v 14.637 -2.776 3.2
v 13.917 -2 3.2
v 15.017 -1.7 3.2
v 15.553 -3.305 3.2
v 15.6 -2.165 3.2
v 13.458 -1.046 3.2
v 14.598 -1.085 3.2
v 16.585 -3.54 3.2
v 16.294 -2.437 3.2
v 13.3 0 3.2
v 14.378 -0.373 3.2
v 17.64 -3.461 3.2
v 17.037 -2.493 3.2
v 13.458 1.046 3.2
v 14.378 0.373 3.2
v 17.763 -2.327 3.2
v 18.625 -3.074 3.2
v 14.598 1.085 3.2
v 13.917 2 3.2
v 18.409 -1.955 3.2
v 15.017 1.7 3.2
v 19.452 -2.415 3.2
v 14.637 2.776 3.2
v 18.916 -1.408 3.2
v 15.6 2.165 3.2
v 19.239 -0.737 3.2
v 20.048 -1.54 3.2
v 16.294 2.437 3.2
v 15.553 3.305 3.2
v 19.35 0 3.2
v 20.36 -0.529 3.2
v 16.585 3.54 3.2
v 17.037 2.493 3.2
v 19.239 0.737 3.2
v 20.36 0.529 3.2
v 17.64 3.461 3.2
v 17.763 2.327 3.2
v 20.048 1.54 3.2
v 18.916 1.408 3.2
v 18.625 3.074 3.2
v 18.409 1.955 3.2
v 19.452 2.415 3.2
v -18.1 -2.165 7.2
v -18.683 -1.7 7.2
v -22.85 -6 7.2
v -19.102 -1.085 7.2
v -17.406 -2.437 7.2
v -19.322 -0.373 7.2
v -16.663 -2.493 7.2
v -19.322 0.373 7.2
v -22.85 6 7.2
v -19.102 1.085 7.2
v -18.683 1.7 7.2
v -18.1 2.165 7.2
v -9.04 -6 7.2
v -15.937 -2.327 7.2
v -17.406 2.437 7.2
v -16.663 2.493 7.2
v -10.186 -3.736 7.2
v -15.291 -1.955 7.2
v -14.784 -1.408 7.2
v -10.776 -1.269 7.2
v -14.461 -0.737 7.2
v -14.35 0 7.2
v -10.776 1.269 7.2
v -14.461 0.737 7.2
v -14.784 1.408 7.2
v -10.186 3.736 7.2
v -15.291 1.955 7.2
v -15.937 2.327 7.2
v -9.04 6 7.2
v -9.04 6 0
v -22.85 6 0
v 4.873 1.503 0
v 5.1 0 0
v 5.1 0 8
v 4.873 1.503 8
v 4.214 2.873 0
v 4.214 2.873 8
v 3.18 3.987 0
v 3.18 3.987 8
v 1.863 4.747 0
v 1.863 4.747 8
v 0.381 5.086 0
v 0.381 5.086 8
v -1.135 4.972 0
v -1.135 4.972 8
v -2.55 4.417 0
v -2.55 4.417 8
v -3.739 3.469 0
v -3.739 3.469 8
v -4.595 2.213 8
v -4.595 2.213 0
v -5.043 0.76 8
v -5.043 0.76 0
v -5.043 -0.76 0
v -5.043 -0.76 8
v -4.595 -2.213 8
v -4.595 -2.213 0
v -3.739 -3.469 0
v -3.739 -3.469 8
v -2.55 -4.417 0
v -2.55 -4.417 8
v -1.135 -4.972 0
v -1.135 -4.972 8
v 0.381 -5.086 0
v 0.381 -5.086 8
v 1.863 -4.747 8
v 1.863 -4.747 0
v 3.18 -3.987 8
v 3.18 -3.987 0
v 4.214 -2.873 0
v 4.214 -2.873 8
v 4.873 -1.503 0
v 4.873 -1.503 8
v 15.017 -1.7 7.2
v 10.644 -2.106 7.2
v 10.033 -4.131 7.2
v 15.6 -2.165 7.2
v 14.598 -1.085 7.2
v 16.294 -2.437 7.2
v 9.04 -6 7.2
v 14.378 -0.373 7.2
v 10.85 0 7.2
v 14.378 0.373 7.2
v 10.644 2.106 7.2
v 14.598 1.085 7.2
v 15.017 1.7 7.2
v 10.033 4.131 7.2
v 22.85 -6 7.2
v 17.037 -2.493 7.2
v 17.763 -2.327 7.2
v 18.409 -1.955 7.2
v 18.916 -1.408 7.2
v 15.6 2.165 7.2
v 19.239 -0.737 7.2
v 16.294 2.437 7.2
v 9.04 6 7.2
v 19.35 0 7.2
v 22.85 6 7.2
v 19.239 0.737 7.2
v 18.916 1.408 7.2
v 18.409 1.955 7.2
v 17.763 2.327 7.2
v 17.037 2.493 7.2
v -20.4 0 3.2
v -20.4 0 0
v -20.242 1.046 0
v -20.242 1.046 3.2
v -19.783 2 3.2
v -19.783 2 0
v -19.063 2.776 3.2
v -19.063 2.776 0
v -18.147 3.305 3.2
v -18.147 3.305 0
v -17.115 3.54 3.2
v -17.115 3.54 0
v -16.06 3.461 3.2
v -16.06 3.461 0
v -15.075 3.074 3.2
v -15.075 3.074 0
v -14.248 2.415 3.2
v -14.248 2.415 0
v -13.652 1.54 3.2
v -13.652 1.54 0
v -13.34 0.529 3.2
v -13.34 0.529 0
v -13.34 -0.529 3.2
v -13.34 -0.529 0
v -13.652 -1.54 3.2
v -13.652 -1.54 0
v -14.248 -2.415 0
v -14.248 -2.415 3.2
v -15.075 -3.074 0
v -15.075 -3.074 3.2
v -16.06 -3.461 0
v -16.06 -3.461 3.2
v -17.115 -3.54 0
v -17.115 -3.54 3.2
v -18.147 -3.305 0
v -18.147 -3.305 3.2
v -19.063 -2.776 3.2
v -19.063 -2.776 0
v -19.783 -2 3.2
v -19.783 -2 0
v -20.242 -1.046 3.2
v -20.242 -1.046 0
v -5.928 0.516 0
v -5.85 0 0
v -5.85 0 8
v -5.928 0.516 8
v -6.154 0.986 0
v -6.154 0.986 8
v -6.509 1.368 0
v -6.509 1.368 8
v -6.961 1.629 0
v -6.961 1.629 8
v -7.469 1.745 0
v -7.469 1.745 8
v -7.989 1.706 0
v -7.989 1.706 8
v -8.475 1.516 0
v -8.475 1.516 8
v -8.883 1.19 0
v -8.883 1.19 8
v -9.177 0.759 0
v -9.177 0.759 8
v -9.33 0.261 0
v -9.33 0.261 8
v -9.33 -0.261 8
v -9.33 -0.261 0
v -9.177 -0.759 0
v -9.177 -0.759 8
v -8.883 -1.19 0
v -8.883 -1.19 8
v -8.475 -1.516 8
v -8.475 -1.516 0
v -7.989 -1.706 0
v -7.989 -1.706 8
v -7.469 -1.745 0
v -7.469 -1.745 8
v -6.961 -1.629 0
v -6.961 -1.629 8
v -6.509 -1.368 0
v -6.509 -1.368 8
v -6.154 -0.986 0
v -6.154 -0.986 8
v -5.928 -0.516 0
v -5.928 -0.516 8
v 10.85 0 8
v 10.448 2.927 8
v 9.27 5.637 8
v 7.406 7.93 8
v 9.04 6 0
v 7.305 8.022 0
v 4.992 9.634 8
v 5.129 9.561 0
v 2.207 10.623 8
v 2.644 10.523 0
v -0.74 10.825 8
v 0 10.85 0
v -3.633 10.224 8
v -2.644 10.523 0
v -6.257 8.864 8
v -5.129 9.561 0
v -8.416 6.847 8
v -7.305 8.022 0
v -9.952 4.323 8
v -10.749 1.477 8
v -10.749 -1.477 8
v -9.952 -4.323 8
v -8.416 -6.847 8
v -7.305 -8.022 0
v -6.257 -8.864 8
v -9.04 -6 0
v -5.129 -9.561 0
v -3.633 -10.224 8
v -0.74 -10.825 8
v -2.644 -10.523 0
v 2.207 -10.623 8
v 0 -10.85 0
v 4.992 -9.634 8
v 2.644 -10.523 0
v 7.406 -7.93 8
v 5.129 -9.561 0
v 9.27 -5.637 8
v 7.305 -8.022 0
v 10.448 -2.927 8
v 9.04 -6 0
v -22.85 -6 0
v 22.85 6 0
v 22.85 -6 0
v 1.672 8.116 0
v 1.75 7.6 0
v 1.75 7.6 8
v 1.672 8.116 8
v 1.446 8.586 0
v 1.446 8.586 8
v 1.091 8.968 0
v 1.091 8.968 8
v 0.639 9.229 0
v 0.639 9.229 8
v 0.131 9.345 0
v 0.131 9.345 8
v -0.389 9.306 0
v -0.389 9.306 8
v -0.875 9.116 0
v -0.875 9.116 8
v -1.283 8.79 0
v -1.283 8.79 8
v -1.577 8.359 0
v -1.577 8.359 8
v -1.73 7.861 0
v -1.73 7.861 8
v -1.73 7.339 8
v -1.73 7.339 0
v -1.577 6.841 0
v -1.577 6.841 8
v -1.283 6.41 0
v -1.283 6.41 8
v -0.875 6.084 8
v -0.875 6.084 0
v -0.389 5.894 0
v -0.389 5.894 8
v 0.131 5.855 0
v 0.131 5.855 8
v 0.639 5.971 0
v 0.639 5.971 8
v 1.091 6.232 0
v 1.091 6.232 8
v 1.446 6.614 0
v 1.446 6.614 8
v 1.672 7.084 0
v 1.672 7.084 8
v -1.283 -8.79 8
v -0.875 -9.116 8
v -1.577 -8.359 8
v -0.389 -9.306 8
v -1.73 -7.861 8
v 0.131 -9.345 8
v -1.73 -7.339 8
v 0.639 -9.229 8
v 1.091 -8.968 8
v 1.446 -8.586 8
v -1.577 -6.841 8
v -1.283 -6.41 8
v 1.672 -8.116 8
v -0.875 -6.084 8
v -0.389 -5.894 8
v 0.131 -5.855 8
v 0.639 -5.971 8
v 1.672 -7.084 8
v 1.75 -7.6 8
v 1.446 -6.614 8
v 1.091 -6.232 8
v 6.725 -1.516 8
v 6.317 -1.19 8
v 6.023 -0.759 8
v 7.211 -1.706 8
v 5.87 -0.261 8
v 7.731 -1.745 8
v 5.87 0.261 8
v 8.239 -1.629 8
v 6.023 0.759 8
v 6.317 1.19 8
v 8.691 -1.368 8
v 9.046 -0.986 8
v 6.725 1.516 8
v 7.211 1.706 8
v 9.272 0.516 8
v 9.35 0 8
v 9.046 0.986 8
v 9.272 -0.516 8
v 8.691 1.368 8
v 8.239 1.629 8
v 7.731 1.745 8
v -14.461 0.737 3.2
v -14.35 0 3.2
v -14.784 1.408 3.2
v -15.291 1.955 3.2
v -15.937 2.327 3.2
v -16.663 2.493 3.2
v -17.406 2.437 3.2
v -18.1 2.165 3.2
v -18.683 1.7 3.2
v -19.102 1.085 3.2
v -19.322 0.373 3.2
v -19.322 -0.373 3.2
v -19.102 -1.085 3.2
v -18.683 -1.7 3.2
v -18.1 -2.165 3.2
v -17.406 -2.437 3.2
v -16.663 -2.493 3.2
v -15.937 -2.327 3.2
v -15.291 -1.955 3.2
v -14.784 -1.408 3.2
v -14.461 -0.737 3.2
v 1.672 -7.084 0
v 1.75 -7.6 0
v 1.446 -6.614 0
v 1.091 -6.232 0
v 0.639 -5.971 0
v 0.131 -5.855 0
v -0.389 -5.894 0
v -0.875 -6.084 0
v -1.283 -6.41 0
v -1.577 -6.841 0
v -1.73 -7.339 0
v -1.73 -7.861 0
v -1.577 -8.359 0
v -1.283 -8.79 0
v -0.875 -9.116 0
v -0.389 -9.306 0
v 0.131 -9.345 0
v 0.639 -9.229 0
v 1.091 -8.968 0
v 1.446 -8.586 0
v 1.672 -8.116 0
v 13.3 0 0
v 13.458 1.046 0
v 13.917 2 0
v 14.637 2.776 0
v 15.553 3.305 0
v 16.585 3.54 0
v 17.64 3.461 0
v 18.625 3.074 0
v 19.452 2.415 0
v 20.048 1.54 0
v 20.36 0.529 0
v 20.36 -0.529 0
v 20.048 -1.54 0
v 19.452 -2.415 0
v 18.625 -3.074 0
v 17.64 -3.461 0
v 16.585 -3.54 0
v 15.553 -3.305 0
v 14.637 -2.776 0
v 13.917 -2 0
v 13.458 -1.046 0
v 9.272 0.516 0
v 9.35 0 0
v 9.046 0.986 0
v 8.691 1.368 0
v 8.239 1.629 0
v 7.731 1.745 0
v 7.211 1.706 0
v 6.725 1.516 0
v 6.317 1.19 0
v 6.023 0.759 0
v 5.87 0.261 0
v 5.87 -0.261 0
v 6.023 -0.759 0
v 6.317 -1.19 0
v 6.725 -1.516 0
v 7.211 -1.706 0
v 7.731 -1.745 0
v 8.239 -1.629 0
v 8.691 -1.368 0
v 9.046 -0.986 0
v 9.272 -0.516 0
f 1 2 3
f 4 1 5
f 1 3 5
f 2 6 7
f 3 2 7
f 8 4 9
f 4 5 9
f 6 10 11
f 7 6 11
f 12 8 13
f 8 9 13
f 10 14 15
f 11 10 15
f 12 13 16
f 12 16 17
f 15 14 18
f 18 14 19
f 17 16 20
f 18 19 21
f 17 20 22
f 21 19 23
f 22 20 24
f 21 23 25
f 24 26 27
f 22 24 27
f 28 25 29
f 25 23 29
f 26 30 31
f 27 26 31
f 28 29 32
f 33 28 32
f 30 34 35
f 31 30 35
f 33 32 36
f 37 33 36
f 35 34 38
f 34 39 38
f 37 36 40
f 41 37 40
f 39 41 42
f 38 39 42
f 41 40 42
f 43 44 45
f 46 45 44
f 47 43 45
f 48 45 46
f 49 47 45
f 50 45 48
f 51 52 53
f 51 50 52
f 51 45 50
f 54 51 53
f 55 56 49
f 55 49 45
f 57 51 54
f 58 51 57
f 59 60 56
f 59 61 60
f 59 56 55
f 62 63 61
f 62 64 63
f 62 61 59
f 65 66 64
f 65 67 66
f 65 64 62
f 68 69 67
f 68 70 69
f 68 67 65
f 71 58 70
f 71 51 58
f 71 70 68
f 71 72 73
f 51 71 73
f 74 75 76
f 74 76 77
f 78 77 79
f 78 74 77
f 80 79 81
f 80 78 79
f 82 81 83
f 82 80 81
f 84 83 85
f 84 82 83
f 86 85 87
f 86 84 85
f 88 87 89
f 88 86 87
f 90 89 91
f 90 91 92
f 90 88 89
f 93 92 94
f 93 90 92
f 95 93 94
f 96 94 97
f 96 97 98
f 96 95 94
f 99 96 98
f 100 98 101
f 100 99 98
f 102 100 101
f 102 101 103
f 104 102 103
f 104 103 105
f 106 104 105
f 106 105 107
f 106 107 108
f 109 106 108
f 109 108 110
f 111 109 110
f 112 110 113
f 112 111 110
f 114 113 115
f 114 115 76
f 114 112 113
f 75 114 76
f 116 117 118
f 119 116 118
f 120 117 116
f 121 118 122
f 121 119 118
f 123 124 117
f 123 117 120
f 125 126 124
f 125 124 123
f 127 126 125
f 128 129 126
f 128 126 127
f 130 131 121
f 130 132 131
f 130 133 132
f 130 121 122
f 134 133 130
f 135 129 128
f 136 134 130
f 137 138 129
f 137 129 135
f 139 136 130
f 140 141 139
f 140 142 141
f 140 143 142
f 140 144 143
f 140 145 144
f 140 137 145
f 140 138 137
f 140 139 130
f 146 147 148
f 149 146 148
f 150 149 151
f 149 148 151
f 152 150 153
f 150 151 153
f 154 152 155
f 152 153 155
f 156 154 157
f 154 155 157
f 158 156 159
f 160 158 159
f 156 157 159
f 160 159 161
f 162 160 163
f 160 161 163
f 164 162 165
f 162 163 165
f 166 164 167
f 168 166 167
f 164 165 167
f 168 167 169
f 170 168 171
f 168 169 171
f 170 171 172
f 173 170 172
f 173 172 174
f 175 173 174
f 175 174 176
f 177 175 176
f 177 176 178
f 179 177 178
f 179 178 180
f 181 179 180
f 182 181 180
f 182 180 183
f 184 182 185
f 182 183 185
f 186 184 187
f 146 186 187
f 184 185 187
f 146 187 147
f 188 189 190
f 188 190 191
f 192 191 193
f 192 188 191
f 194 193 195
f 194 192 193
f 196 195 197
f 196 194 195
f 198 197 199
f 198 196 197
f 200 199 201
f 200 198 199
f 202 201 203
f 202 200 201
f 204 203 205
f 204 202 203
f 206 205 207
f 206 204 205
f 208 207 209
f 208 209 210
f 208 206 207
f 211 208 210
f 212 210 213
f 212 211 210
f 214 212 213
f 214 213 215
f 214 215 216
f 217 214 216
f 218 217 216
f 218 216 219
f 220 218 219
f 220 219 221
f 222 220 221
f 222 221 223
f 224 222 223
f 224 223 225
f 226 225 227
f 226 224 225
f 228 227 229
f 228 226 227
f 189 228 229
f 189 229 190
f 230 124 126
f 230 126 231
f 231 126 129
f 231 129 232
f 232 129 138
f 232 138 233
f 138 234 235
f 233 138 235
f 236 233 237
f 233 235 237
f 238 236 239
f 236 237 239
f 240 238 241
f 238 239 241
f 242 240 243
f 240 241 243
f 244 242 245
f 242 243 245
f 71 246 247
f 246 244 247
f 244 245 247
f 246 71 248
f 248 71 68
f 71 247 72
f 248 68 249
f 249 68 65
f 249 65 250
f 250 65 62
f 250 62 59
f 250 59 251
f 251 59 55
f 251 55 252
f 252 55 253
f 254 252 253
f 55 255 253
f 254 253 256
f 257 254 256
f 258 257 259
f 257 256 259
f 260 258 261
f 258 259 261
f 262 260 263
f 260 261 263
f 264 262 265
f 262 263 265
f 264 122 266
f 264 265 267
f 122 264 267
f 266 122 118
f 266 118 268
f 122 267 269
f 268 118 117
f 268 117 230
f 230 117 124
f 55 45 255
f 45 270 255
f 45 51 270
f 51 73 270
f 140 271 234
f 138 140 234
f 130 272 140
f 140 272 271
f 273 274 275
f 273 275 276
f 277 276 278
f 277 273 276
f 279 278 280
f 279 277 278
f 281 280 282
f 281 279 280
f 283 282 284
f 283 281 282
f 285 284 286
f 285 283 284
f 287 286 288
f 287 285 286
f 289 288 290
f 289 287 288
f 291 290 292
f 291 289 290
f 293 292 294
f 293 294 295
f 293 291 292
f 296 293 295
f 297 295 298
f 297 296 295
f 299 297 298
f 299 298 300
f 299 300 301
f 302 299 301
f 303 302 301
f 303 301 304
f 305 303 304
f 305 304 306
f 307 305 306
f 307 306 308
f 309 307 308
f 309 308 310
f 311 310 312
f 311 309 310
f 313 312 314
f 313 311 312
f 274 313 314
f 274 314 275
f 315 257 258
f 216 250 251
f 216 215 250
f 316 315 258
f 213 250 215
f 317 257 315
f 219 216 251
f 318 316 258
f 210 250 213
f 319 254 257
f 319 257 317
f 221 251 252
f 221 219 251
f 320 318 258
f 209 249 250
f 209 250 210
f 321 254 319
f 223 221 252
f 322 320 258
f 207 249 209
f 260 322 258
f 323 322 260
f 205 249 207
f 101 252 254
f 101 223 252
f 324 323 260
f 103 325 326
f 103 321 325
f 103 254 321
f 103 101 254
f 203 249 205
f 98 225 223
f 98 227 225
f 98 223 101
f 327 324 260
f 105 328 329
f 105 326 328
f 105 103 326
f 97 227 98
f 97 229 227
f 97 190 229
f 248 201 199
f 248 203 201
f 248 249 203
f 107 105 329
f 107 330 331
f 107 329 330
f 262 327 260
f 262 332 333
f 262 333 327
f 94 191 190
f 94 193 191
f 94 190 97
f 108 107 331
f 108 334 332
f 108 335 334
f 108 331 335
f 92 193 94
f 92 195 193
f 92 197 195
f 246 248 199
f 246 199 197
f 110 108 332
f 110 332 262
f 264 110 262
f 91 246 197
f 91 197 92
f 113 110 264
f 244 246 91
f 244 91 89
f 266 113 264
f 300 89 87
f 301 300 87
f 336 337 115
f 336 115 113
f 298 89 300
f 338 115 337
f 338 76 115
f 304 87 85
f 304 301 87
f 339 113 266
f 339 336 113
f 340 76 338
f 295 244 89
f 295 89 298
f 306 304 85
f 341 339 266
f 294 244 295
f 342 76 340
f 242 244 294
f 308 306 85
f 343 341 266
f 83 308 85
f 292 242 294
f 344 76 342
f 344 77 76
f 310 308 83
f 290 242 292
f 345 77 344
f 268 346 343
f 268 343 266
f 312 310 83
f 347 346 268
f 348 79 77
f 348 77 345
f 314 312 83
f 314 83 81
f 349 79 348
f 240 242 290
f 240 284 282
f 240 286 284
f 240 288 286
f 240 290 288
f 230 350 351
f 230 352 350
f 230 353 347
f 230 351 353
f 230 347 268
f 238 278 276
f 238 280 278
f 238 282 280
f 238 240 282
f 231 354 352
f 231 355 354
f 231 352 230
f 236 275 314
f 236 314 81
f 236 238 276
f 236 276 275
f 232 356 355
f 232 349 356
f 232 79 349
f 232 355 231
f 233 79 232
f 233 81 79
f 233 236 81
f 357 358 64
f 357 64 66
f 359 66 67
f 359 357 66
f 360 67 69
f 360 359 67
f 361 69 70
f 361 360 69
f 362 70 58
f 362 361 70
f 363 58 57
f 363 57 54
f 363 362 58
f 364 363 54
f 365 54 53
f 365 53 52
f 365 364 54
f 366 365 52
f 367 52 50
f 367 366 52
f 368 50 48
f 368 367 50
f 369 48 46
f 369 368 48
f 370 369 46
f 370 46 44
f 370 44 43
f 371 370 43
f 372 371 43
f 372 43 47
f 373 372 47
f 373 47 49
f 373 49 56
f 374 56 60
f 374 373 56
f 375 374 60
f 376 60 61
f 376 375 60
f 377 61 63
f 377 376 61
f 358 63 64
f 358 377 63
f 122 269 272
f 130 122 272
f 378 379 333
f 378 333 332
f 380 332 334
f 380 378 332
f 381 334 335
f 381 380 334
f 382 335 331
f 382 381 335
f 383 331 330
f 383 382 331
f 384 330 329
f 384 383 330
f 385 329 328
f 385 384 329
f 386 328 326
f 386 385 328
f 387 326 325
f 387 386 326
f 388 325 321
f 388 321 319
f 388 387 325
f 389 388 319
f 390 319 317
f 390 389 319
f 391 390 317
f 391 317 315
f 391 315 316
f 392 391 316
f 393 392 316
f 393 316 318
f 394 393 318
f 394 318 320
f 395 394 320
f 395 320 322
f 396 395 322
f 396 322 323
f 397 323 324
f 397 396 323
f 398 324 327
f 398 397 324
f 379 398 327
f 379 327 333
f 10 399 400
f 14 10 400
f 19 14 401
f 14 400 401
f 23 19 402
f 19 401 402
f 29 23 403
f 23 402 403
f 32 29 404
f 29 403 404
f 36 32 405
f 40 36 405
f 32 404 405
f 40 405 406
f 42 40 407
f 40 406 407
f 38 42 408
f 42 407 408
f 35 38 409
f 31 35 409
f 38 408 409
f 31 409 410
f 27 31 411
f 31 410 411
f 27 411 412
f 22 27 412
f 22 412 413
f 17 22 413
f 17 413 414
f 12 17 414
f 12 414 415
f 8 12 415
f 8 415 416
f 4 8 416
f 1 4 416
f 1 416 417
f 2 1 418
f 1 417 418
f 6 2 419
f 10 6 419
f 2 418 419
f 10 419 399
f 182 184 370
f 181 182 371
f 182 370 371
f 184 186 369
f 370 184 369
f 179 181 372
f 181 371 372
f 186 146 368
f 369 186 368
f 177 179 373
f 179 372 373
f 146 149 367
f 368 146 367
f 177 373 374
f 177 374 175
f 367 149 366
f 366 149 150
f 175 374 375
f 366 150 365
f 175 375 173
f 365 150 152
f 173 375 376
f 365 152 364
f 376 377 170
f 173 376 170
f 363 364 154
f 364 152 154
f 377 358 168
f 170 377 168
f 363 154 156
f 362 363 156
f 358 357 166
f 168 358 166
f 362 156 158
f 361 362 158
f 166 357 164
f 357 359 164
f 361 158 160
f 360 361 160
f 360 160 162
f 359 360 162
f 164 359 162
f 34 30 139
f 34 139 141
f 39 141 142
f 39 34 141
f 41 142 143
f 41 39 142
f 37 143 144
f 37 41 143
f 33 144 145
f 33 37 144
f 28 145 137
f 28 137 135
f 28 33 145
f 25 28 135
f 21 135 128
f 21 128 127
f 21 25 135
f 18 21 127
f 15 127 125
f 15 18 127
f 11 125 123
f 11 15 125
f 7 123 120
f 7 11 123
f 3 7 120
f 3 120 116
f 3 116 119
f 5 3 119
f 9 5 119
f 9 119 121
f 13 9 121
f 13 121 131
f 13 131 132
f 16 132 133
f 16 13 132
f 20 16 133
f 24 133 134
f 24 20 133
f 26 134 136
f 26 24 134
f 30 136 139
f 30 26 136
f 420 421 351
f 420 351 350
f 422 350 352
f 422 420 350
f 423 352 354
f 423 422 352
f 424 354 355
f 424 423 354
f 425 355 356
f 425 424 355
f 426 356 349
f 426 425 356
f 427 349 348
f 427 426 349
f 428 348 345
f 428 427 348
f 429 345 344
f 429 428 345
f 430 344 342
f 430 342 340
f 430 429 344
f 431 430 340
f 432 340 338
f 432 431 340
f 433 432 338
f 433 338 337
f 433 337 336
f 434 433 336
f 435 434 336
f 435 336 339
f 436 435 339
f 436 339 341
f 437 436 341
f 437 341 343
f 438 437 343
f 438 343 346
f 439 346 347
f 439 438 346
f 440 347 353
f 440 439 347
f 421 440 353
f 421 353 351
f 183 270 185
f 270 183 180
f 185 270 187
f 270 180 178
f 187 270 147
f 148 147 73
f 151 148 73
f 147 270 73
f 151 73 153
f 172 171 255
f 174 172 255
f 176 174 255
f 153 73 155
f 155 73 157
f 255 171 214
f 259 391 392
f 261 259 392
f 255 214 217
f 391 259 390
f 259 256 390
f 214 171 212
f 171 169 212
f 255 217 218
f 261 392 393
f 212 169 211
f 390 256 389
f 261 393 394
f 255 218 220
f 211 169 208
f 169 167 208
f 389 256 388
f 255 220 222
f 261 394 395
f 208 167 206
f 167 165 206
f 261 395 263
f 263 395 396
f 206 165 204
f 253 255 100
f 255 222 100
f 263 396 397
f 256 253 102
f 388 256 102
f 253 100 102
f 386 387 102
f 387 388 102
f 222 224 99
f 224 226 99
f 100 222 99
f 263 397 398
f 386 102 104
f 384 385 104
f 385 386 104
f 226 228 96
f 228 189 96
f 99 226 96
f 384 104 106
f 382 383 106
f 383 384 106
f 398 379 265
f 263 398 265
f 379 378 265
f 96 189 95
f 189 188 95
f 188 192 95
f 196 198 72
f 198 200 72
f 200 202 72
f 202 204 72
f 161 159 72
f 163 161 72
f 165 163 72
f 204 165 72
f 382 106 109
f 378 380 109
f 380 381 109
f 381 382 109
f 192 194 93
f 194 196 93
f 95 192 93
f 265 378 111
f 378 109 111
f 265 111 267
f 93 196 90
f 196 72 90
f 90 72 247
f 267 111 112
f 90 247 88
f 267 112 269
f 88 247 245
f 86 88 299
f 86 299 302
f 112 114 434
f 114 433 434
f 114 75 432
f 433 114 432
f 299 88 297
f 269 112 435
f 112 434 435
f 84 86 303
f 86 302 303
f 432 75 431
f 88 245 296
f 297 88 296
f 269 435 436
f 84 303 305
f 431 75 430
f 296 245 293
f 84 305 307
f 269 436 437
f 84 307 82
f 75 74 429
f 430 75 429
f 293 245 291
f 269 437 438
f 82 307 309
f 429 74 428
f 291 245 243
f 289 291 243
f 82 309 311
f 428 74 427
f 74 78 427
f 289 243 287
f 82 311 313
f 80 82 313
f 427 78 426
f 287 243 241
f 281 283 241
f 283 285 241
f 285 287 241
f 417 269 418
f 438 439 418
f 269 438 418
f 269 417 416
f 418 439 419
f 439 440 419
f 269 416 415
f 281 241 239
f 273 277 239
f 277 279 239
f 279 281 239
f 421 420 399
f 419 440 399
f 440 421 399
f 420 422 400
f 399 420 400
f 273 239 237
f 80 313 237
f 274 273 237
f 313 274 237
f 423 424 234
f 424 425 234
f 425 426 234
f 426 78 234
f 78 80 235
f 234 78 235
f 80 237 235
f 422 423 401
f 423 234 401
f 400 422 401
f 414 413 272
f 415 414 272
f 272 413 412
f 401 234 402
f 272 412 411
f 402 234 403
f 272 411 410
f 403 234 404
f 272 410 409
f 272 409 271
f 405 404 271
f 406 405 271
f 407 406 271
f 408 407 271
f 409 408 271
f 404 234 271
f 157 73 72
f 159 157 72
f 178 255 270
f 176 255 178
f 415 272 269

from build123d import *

# Parameters (mm, degrees)
SKETCH1_R           = 10.85
SKETCH1_R_2         = 5.1
SKETCH1_R_3         = 1.75
BOSS_EXTRUDE1_DEPTH = 8
SKETCH2_R           = 3.55
BOSS_EXTRUDE3_DEPTH = 3.2
SKETCH3_R           = 2.5
BOSS_EXTRUDE4_DEPTH = 4


with BuildPart() as part:
    # Sketch1 → Boss-Extrude1 (new body)
    with BuildSketch(Plane.XY):
        Circle(SKETCH1_R)
        Circle(SKETCH1_R_2, mode=Mode.SUBTRACT)
        with Locations((-7.6, 0)):
            Circle(SKETCH1_R_3, mode=Mode.SUBTRACT)
        with Locations((0, 7.6)):
            Circle(SKETCH1_R_3, mode=Mode.SUBTRACT)
        with Locations((7.6, 0)):
            Circle(SKETCH1_R_3, mode=Mode.SUBTRACT)
        with Locations((0, -7.6)):
            Circle(SKETCH1_R_3, mode=Mode.SUBTRACT)
    extrude(amount=BOSS_EXTRUDE1_DEPTH)

    # Sketch2 → Boss-Extrude3 (add)
    with BuildSketch(Plane(origin=(0, 0, 0), x_dir=(-1, 0, 0), z_dir=(0, 0, -1))):
        with BuildLine():
            Line((-22.85, -6), (-22.85, 6))
            Line((-22.85, 6), (-9.040049779, 6))
            ThreePointArc((-9.040049779, 6), (-10.85, 0), (-9.040049779, -6))
            Line((-9.040049779, -6), (-22.85, -6))
        make_face()
        with Locations((-16.85, 0)):
            Circle(SKETCH2_R, mode=Mode.SUBTRACT)
        with BuildLine():
            Line((22.85, -6), (22.85, 6))
            Line((22.85, 6), (9.040049779, 6))
            ThreePointArc((9.040049779, 6), (10.85, 0), (9.040049779, -6))
            Line((9.040049779, -6), (22.85, -6))
        make_face()
        with Locations((16.85, 0)):
            Circle(SKETCH2_R, mode=Mode.SUBTRACT)
    extrude(amount=-BOSS_EXTRUDE3_DEPTH)

    # Sketch3 → Boss-Extrude4 (add)
    with BuildSketch(Plane.XY.offset(3.2)):
        with BuildLine():
            Line((-9.040049779, 6), (-22.85, 6))
            Line((-22.85, 6), (-22.85, -6))
            Line((-22.85, -6), (-9.040049779, -6))
            ThreePointArc((-9.040049779, -6), (-10.85, 0), (-9.040049779, 6))
        make_face()
        with Locations((-16.85, 0)):
            Circle(SKETCH3_R, mode=Mode.SUBTRACT)
        with BuildLine():
            Line((9.040049779, -6), (22.85, -6))
            Line((22.85, -6), (22.85, 6))
            Line((22.85, 6), (9.040049779, 6))
            ThreePointArc((9.040049779, 6), (10.85, 0), (9.040049779, -6))
        make_face()
        with Locations((16.85, 0)):
            Circle(SKETCH3_R, mode=Mode.SUBTRACT)
    extrude(amount=BOSS_EXTRUDE4_DEPTH)


solid = part.part
